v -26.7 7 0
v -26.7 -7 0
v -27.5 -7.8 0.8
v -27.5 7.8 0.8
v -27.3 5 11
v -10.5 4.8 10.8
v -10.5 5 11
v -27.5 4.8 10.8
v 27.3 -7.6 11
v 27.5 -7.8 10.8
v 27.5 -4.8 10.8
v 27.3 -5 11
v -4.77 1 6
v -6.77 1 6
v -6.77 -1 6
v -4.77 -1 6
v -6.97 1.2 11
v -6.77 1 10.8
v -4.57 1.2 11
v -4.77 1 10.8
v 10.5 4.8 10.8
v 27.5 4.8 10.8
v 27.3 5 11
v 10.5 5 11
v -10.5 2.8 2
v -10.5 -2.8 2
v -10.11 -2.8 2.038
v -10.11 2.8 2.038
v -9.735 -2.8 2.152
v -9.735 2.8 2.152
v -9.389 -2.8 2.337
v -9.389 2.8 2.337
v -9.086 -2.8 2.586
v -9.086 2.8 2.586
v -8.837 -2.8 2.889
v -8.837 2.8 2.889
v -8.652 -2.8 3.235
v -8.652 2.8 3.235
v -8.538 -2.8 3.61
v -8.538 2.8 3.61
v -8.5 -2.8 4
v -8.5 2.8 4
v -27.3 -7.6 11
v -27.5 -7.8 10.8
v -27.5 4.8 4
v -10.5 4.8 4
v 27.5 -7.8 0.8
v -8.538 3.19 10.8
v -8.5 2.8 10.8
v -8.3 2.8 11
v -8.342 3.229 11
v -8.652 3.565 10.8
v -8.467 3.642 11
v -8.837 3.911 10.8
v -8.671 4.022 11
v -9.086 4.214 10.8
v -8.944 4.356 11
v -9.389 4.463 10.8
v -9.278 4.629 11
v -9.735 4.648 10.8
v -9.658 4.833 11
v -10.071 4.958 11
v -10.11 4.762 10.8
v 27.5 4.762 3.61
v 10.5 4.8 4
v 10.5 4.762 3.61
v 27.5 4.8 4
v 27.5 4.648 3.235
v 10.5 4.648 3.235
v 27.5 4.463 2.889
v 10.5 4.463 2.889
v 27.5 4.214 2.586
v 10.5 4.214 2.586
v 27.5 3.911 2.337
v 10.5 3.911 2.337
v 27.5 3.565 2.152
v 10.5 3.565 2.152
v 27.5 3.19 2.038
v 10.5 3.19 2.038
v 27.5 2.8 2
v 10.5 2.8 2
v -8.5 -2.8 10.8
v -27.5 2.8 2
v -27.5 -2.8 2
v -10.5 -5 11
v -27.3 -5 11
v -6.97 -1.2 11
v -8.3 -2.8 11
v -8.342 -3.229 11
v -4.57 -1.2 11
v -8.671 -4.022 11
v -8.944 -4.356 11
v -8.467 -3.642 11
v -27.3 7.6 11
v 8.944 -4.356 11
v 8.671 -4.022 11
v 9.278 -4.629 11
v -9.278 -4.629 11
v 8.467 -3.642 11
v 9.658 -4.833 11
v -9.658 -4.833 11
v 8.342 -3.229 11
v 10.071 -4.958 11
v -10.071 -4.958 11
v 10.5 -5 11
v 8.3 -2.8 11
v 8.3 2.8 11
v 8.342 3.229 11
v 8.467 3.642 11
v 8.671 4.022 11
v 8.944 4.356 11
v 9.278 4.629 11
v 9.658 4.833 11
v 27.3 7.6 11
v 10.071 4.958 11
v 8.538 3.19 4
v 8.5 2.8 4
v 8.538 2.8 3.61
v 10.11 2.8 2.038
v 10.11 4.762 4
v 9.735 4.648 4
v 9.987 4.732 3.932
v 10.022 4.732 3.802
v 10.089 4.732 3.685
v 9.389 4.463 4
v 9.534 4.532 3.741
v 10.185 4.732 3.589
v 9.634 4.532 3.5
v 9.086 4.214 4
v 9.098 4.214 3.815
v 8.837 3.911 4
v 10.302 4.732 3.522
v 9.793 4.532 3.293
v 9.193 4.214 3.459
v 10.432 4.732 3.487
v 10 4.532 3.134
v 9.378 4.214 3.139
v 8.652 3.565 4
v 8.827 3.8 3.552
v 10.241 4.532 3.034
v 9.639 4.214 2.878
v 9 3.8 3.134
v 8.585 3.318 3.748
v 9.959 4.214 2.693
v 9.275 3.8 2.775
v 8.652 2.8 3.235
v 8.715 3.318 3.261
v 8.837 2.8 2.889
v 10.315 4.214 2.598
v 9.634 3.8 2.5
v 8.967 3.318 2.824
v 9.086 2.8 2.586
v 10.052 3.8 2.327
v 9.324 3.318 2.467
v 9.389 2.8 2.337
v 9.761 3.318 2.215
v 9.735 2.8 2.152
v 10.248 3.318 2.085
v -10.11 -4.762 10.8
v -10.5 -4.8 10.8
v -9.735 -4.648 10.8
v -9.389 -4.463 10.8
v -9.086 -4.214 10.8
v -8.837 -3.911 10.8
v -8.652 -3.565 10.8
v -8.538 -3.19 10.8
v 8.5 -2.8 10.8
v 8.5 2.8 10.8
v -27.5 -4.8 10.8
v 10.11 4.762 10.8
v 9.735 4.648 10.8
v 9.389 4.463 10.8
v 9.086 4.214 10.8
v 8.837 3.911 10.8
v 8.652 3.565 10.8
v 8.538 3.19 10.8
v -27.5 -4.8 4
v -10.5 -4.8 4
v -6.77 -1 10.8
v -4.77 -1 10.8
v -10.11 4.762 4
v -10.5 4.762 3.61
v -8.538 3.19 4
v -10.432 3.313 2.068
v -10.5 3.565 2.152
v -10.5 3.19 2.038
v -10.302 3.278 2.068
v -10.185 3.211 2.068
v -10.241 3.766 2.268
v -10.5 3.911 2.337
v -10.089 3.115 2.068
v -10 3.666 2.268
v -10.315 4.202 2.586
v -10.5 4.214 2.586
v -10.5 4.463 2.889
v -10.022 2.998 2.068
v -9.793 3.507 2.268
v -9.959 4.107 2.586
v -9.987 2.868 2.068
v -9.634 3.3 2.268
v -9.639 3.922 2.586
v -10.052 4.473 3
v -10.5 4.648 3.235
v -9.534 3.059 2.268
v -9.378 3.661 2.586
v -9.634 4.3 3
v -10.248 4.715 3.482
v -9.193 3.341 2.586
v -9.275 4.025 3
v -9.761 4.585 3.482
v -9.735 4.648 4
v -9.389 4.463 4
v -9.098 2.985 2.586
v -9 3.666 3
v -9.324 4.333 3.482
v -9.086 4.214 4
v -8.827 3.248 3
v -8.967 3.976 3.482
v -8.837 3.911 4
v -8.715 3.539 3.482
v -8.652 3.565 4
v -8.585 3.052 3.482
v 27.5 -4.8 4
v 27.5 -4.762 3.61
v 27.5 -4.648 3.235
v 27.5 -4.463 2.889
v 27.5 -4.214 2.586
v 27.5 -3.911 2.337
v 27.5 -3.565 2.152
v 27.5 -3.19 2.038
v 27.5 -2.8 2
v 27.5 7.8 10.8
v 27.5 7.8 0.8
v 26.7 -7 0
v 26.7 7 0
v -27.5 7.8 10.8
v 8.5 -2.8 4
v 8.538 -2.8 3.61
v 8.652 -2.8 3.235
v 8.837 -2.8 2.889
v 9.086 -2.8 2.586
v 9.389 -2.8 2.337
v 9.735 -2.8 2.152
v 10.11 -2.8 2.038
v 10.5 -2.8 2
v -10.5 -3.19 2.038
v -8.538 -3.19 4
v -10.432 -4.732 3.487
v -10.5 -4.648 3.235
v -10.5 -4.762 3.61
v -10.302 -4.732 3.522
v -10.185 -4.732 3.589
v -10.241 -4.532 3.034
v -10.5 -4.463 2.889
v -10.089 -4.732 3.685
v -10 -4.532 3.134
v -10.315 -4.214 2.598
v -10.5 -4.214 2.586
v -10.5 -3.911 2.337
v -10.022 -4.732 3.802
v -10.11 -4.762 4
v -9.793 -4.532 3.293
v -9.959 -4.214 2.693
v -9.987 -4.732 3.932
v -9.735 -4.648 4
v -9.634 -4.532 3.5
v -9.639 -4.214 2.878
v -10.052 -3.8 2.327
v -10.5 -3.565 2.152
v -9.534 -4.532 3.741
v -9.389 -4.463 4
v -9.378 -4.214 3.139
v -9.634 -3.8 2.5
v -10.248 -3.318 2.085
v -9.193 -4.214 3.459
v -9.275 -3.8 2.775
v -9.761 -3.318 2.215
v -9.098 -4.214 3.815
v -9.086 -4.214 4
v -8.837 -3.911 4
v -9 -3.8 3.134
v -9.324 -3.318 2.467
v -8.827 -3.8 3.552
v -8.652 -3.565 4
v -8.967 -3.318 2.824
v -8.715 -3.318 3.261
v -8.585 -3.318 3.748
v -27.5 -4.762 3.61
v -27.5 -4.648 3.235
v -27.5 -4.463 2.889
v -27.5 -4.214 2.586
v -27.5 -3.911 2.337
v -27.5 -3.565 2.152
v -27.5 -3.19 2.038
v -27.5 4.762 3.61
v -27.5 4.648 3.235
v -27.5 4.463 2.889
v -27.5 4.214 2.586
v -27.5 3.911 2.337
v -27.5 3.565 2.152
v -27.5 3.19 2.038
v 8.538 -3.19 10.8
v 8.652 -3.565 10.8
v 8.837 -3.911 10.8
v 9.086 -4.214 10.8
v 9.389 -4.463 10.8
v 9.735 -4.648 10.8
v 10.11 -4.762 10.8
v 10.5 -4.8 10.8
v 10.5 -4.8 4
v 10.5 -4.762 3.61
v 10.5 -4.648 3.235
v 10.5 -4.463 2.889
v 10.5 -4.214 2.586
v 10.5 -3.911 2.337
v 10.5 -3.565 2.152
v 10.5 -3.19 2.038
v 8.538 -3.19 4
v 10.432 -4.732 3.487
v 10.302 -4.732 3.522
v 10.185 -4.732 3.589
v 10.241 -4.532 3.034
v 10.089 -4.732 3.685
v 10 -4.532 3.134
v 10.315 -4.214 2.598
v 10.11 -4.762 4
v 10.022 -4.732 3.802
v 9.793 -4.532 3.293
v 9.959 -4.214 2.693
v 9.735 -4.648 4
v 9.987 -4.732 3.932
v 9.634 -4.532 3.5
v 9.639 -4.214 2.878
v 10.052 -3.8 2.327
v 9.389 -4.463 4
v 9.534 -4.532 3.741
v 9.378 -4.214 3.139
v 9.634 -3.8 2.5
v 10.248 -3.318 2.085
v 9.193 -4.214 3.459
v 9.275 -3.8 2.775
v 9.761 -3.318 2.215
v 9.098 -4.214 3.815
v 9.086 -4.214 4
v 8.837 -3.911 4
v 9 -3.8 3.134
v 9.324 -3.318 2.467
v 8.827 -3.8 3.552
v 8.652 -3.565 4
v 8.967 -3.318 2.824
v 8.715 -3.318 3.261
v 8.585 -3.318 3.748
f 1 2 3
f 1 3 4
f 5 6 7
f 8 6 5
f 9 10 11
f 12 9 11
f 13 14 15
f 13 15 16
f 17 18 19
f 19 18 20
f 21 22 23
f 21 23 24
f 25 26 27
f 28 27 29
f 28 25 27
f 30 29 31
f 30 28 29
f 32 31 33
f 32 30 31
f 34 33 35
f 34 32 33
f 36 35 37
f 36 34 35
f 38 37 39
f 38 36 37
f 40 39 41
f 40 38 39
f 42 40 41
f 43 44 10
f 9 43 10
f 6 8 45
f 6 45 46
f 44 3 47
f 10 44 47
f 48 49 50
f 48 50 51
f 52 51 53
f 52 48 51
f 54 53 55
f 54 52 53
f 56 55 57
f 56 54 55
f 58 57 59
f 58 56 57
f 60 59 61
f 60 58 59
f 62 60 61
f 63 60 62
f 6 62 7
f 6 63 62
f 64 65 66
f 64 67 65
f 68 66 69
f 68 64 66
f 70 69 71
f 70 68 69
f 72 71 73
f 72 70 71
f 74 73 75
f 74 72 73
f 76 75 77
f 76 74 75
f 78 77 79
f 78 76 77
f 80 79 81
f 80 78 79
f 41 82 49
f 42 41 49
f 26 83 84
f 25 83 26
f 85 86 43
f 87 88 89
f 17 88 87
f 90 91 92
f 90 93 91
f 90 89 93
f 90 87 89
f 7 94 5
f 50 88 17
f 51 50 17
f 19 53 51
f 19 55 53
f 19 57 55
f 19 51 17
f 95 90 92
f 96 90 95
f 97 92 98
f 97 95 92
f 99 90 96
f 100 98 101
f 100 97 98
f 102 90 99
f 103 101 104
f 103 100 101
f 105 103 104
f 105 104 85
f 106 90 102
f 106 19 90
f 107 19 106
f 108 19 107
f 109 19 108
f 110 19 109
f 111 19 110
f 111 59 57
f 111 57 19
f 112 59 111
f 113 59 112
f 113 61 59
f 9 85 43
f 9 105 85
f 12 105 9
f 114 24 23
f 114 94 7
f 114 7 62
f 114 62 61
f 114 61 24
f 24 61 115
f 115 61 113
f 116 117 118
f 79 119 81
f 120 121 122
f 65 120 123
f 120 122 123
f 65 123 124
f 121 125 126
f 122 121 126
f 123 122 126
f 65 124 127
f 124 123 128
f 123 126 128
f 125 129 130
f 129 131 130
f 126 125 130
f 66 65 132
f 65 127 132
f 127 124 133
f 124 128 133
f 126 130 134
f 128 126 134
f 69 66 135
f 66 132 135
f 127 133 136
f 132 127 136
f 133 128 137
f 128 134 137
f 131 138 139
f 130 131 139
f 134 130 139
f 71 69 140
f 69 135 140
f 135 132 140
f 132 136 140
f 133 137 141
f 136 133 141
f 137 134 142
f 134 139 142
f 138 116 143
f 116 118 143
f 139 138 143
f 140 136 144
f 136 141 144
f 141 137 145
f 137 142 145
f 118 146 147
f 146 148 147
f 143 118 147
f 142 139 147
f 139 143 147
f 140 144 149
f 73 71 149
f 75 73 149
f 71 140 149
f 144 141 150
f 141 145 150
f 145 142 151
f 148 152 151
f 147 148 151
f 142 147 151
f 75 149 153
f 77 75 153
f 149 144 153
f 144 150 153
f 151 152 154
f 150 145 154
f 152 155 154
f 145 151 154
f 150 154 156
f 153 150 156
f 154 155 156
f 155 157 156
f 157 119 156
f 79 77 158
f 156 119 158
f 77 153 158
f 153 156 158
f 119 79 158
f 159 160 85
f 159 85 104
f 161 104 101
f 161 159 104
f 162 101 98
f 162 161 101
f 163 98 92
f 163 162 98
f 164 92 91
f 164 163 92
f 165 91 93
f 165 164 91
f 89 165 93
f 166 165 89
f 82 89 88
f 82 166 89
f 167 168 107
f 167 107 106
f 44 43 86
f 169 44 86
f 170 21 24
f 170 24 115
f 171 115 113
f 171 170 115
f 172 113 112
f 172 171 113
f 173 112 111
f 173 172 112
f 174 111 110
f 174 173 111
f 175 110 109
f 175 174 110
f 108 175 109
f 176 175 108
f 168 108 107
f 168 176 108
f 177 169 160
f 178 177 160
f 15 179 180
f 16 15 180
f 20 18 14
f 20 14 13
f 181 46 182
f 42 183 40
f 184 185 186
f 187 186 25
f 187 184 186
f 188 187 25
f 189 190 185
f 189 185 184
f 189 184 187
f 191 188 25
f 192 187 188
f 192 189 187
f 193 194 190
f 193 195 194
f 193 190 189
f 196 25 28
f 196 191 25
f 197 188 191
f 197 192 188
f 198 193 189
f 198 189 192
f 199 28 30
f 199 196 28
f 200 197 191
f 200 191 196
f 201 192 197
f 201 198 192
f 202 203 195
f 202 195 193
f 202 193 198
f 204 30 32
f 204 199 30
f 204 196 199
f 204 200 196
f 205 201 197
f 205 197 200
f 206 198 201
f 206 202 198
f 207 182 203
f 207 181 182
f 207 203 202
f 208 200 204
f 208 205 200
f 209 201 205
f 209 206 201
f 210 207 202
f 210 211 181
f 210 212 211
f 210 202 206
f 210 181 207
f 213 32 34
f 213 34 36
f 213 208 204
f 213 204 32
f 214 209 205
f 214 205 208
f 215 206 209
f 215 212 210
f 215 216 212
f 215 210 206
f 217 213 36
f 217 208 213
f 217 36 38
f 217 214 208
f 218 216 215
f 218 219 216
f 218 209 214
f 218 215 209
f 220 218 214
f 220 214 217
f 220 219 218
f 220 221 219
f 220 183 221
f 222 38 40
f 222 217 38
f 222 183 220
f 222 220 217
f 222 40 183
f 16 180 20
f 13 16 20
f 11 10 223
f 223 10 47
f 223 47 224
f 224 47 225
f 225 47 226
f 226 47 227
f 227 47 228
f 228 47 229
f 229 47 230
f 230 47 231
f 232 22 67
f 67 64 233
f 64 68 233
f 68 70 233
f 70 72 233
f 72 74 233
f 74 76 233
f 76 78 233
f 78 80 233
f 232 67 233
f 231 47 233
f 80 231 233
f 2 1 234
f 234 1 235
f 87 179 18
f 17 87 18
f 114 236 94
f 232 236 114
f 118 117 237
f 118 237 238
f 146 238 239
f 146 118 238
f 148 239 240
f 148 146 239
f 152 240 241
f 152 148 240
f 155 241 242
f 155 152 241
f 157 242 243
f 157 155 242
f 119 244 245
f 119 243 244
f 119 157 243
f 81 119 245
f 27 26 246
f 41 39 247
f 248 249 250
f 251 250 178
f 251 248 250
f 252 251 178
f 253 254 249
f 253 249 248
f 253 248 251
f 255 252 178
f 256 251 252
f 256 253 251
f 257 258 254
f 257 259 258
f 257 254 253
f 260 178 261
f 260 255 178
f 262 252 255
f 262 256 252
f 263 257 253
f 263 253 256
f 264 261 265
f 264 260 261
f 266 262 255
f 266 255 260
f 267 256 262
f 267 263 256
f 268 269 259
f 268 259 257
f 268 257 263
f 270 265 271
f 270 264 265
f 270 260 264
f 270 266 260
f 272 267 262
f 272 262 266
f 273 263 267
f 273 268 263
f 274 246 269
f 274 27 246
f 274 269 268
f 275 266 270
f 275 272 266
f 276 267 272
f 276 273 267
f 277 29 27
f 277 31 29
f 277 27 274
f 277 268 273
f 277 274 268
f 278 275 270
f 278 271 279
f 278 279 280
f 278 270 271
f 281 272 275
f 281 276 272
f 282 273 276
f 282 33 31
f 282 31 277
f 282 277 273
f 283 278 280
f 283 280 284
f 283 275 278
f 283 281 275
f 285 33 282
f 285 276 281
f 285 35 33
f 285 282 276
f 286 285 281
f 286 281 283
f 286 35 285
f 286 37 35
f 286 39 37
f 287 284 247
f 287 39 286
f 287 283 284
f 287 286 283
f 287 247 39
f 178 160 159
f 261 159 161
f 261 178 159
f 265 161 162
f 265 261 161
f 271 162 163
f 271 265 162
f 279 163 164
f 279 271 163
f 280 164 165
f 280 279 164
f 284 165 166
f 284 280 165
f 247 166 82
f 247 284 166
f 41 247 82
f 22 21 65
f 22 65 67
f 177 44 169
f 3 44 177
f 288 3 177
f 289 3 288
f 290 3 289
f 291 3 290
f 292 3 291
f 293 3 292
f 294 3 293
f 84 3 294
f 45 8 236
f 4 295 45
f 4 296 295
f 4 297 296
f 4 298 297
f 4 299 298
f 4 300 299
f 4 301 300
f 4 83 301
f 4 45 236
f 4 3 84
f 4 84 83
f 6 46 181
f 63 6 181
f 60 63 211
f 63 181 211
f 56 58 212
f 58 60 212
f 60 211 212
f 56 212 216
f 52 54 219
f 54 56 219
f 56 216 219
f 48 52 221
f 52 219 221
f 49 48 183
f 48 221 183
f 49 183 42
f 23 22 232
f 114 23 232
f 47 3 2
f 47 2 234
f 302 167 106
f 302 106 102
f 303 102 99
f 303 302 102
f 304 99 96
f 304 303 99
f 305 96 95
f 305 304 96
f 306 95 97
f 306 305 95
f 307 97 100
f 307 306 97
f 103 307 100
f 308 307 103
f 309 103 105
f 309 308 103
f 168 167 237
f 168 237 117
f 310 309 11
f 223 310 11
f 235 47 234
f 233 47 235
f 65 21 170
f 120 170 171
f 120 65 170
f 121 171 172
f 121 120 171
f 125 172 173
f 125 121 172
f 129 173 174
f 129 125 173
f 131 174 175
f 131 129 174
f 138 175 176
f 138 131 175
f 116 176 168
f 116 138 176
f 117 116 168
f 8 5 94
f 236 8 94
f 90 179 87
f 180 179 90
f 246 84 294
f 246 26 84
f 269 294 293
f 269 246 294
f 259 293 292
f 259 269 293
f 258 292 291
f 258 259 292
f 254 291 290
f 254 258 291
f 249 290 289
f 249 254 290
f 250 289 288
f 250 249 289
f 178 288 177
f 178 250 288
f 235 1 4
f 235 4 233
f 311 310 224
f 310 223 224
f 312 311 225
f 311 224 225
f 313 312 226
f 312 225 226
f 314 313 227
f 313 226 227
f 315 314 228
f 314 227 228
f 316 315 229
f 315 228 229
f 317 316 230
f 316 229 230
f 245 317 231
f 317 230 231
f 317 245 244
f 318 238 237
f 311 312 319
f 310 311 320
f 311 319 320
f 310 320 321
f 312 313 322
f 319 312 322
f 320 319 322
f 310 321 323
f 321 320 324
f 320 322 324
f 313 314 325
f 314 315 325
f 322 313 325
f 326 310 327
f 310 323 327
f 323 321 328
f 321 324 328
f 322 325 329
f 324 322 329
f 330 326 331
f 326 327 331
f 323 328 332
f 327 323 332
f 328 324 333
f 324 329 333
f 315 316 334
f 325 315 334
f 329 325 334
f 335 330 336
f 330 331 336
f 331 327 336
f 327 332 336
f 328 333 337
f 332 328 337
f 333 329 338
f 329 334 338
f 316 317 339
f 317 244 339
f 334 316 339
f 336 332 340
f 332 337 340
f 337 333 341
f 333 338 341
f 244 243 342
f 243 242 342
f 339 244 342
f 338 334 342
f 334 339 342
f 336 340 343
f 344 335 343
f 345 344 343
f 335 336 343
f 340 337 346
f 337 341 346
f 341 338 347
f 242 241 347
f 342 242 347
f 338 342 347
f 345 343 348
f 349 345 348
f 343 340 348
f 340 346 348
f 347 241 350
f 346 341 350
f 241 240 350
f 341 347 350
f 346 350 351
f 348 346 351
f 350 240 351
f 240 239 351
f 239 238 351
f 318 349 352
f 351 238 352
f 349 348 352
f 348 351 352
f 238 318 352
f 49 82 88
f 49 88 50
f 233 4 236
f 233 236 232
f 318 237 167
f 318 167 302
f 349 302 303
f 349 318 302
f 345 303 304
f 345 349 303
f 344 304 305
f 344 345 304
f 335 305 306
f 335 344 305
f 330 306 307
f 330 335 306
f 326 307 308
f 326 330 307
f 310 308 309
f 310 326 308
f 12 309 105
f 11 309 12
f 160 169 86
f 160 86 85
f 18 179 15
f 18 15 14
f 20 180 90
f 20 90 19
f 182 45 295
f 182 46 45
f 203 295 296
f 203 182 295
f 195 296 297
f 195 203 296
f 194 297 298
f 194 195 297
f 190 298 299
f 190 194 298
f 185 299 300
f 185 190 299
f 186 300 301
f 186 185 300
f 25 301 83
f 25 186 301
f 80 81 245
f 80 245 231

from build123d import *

# Parameters (mm, degrees)
F0_W     = 55
F0_H     = 15.6
F1_DEPTH = 11
F2_W     = 2
F2_H     = 2
F3_DEPTH = 5
F4_W     = 19
F4_H     = 9.6
F5_DEPTH = 9
F6_R     = 2
F7_SIZE  = 0.2
F8_SIZE  = 0.8


with BuildPart() as f1:
    # F0 (on Top) → F1 (new body)
    with BuildSketch(Plane.XY):
        Rectangle(F0_W, F0_H)
    extrude(amount=F1_DEPTH)

    # F2 (on face) → F3 (cut)
    with BuildSketch(Plane.XY.offset(11)):
        with Locations((-5.77, 0)):
            Rectangle(F2_W, F2_H)
    extrude(amount=-F3_DEPTH, mode=Mode.SUBTRACT)

    # F4 (on face) → F5 (cut)
    with BuildSketch(Plane.XY.offset(11)):
        with Locations((-18, 0)):
            Rectangle(F4_W, F4_H)
        with Locations((18, 0)):
            Rectangle(F4_W, F4_H)
    extrude(amount=-F5_DEPTH, mode=Mode.SUBTRACT)

    # F6
    f6_edges = [f1.edges().sort_by_distance(p)[0] for p in [
        (-8.5, 4.8, 6.5),
        (-18, 4.8, 2),
        (-8.5, 0, 2),
        (-18, -4.8, 2),
        (-8.5, -4.8, 6.5),
        (8.5, 0, 2),
        (8.5, 4.8, 6.5),
        (18, 4.8, 2),
        (18, -4.8, 2),
        (8.5, -4.8, 6.5),
    ]]
    fillet(f6_edges, radius=F6_R)

    # F7
    f7_edges = [f1.edges().sort_by_distance(p)[0] for p in [
        (-19, -4.8, 11),
        (-9.085786, -4.214214, 11),
        (-27.5, -6.3, 11),
        (-8.5, 0, 11),
        (0, -7.8, 11),
        (-9.085786, 4.214214, 11),
        (27.5, -6.3, 11),
        (-19, 4.8, 11),
        (19, -4.8, 11),
        (-27.5, 6.3, 11),
        (9.085786, -4.214214, 11),
        (0, 7.8, 11),
        (8.5, 0, 11),
        (27.5, 6.3, 11),
        (9.085786, 4.214214, 11),
        (19, 4.8, 11),
        (-6.77, 0, 11),
        (-5.77, 1, 11),
        (-5.77, -1, 11),
        (-4.77, 0, 11),
    ]]
    chamfer(f7_edges, length=F7_SIZE)

    # F8
    f8_edges = [f1.edges().sort_by_distance(p)[0] for p in [
        (27.5, 0, 0),
        (0, 7.8, 0),
        (-27.5, 0, 0),
        (0, -7.8, 0),
    ]]
    chamfer(f8_edges, length=F8_SIZE)


solid = f1.part
